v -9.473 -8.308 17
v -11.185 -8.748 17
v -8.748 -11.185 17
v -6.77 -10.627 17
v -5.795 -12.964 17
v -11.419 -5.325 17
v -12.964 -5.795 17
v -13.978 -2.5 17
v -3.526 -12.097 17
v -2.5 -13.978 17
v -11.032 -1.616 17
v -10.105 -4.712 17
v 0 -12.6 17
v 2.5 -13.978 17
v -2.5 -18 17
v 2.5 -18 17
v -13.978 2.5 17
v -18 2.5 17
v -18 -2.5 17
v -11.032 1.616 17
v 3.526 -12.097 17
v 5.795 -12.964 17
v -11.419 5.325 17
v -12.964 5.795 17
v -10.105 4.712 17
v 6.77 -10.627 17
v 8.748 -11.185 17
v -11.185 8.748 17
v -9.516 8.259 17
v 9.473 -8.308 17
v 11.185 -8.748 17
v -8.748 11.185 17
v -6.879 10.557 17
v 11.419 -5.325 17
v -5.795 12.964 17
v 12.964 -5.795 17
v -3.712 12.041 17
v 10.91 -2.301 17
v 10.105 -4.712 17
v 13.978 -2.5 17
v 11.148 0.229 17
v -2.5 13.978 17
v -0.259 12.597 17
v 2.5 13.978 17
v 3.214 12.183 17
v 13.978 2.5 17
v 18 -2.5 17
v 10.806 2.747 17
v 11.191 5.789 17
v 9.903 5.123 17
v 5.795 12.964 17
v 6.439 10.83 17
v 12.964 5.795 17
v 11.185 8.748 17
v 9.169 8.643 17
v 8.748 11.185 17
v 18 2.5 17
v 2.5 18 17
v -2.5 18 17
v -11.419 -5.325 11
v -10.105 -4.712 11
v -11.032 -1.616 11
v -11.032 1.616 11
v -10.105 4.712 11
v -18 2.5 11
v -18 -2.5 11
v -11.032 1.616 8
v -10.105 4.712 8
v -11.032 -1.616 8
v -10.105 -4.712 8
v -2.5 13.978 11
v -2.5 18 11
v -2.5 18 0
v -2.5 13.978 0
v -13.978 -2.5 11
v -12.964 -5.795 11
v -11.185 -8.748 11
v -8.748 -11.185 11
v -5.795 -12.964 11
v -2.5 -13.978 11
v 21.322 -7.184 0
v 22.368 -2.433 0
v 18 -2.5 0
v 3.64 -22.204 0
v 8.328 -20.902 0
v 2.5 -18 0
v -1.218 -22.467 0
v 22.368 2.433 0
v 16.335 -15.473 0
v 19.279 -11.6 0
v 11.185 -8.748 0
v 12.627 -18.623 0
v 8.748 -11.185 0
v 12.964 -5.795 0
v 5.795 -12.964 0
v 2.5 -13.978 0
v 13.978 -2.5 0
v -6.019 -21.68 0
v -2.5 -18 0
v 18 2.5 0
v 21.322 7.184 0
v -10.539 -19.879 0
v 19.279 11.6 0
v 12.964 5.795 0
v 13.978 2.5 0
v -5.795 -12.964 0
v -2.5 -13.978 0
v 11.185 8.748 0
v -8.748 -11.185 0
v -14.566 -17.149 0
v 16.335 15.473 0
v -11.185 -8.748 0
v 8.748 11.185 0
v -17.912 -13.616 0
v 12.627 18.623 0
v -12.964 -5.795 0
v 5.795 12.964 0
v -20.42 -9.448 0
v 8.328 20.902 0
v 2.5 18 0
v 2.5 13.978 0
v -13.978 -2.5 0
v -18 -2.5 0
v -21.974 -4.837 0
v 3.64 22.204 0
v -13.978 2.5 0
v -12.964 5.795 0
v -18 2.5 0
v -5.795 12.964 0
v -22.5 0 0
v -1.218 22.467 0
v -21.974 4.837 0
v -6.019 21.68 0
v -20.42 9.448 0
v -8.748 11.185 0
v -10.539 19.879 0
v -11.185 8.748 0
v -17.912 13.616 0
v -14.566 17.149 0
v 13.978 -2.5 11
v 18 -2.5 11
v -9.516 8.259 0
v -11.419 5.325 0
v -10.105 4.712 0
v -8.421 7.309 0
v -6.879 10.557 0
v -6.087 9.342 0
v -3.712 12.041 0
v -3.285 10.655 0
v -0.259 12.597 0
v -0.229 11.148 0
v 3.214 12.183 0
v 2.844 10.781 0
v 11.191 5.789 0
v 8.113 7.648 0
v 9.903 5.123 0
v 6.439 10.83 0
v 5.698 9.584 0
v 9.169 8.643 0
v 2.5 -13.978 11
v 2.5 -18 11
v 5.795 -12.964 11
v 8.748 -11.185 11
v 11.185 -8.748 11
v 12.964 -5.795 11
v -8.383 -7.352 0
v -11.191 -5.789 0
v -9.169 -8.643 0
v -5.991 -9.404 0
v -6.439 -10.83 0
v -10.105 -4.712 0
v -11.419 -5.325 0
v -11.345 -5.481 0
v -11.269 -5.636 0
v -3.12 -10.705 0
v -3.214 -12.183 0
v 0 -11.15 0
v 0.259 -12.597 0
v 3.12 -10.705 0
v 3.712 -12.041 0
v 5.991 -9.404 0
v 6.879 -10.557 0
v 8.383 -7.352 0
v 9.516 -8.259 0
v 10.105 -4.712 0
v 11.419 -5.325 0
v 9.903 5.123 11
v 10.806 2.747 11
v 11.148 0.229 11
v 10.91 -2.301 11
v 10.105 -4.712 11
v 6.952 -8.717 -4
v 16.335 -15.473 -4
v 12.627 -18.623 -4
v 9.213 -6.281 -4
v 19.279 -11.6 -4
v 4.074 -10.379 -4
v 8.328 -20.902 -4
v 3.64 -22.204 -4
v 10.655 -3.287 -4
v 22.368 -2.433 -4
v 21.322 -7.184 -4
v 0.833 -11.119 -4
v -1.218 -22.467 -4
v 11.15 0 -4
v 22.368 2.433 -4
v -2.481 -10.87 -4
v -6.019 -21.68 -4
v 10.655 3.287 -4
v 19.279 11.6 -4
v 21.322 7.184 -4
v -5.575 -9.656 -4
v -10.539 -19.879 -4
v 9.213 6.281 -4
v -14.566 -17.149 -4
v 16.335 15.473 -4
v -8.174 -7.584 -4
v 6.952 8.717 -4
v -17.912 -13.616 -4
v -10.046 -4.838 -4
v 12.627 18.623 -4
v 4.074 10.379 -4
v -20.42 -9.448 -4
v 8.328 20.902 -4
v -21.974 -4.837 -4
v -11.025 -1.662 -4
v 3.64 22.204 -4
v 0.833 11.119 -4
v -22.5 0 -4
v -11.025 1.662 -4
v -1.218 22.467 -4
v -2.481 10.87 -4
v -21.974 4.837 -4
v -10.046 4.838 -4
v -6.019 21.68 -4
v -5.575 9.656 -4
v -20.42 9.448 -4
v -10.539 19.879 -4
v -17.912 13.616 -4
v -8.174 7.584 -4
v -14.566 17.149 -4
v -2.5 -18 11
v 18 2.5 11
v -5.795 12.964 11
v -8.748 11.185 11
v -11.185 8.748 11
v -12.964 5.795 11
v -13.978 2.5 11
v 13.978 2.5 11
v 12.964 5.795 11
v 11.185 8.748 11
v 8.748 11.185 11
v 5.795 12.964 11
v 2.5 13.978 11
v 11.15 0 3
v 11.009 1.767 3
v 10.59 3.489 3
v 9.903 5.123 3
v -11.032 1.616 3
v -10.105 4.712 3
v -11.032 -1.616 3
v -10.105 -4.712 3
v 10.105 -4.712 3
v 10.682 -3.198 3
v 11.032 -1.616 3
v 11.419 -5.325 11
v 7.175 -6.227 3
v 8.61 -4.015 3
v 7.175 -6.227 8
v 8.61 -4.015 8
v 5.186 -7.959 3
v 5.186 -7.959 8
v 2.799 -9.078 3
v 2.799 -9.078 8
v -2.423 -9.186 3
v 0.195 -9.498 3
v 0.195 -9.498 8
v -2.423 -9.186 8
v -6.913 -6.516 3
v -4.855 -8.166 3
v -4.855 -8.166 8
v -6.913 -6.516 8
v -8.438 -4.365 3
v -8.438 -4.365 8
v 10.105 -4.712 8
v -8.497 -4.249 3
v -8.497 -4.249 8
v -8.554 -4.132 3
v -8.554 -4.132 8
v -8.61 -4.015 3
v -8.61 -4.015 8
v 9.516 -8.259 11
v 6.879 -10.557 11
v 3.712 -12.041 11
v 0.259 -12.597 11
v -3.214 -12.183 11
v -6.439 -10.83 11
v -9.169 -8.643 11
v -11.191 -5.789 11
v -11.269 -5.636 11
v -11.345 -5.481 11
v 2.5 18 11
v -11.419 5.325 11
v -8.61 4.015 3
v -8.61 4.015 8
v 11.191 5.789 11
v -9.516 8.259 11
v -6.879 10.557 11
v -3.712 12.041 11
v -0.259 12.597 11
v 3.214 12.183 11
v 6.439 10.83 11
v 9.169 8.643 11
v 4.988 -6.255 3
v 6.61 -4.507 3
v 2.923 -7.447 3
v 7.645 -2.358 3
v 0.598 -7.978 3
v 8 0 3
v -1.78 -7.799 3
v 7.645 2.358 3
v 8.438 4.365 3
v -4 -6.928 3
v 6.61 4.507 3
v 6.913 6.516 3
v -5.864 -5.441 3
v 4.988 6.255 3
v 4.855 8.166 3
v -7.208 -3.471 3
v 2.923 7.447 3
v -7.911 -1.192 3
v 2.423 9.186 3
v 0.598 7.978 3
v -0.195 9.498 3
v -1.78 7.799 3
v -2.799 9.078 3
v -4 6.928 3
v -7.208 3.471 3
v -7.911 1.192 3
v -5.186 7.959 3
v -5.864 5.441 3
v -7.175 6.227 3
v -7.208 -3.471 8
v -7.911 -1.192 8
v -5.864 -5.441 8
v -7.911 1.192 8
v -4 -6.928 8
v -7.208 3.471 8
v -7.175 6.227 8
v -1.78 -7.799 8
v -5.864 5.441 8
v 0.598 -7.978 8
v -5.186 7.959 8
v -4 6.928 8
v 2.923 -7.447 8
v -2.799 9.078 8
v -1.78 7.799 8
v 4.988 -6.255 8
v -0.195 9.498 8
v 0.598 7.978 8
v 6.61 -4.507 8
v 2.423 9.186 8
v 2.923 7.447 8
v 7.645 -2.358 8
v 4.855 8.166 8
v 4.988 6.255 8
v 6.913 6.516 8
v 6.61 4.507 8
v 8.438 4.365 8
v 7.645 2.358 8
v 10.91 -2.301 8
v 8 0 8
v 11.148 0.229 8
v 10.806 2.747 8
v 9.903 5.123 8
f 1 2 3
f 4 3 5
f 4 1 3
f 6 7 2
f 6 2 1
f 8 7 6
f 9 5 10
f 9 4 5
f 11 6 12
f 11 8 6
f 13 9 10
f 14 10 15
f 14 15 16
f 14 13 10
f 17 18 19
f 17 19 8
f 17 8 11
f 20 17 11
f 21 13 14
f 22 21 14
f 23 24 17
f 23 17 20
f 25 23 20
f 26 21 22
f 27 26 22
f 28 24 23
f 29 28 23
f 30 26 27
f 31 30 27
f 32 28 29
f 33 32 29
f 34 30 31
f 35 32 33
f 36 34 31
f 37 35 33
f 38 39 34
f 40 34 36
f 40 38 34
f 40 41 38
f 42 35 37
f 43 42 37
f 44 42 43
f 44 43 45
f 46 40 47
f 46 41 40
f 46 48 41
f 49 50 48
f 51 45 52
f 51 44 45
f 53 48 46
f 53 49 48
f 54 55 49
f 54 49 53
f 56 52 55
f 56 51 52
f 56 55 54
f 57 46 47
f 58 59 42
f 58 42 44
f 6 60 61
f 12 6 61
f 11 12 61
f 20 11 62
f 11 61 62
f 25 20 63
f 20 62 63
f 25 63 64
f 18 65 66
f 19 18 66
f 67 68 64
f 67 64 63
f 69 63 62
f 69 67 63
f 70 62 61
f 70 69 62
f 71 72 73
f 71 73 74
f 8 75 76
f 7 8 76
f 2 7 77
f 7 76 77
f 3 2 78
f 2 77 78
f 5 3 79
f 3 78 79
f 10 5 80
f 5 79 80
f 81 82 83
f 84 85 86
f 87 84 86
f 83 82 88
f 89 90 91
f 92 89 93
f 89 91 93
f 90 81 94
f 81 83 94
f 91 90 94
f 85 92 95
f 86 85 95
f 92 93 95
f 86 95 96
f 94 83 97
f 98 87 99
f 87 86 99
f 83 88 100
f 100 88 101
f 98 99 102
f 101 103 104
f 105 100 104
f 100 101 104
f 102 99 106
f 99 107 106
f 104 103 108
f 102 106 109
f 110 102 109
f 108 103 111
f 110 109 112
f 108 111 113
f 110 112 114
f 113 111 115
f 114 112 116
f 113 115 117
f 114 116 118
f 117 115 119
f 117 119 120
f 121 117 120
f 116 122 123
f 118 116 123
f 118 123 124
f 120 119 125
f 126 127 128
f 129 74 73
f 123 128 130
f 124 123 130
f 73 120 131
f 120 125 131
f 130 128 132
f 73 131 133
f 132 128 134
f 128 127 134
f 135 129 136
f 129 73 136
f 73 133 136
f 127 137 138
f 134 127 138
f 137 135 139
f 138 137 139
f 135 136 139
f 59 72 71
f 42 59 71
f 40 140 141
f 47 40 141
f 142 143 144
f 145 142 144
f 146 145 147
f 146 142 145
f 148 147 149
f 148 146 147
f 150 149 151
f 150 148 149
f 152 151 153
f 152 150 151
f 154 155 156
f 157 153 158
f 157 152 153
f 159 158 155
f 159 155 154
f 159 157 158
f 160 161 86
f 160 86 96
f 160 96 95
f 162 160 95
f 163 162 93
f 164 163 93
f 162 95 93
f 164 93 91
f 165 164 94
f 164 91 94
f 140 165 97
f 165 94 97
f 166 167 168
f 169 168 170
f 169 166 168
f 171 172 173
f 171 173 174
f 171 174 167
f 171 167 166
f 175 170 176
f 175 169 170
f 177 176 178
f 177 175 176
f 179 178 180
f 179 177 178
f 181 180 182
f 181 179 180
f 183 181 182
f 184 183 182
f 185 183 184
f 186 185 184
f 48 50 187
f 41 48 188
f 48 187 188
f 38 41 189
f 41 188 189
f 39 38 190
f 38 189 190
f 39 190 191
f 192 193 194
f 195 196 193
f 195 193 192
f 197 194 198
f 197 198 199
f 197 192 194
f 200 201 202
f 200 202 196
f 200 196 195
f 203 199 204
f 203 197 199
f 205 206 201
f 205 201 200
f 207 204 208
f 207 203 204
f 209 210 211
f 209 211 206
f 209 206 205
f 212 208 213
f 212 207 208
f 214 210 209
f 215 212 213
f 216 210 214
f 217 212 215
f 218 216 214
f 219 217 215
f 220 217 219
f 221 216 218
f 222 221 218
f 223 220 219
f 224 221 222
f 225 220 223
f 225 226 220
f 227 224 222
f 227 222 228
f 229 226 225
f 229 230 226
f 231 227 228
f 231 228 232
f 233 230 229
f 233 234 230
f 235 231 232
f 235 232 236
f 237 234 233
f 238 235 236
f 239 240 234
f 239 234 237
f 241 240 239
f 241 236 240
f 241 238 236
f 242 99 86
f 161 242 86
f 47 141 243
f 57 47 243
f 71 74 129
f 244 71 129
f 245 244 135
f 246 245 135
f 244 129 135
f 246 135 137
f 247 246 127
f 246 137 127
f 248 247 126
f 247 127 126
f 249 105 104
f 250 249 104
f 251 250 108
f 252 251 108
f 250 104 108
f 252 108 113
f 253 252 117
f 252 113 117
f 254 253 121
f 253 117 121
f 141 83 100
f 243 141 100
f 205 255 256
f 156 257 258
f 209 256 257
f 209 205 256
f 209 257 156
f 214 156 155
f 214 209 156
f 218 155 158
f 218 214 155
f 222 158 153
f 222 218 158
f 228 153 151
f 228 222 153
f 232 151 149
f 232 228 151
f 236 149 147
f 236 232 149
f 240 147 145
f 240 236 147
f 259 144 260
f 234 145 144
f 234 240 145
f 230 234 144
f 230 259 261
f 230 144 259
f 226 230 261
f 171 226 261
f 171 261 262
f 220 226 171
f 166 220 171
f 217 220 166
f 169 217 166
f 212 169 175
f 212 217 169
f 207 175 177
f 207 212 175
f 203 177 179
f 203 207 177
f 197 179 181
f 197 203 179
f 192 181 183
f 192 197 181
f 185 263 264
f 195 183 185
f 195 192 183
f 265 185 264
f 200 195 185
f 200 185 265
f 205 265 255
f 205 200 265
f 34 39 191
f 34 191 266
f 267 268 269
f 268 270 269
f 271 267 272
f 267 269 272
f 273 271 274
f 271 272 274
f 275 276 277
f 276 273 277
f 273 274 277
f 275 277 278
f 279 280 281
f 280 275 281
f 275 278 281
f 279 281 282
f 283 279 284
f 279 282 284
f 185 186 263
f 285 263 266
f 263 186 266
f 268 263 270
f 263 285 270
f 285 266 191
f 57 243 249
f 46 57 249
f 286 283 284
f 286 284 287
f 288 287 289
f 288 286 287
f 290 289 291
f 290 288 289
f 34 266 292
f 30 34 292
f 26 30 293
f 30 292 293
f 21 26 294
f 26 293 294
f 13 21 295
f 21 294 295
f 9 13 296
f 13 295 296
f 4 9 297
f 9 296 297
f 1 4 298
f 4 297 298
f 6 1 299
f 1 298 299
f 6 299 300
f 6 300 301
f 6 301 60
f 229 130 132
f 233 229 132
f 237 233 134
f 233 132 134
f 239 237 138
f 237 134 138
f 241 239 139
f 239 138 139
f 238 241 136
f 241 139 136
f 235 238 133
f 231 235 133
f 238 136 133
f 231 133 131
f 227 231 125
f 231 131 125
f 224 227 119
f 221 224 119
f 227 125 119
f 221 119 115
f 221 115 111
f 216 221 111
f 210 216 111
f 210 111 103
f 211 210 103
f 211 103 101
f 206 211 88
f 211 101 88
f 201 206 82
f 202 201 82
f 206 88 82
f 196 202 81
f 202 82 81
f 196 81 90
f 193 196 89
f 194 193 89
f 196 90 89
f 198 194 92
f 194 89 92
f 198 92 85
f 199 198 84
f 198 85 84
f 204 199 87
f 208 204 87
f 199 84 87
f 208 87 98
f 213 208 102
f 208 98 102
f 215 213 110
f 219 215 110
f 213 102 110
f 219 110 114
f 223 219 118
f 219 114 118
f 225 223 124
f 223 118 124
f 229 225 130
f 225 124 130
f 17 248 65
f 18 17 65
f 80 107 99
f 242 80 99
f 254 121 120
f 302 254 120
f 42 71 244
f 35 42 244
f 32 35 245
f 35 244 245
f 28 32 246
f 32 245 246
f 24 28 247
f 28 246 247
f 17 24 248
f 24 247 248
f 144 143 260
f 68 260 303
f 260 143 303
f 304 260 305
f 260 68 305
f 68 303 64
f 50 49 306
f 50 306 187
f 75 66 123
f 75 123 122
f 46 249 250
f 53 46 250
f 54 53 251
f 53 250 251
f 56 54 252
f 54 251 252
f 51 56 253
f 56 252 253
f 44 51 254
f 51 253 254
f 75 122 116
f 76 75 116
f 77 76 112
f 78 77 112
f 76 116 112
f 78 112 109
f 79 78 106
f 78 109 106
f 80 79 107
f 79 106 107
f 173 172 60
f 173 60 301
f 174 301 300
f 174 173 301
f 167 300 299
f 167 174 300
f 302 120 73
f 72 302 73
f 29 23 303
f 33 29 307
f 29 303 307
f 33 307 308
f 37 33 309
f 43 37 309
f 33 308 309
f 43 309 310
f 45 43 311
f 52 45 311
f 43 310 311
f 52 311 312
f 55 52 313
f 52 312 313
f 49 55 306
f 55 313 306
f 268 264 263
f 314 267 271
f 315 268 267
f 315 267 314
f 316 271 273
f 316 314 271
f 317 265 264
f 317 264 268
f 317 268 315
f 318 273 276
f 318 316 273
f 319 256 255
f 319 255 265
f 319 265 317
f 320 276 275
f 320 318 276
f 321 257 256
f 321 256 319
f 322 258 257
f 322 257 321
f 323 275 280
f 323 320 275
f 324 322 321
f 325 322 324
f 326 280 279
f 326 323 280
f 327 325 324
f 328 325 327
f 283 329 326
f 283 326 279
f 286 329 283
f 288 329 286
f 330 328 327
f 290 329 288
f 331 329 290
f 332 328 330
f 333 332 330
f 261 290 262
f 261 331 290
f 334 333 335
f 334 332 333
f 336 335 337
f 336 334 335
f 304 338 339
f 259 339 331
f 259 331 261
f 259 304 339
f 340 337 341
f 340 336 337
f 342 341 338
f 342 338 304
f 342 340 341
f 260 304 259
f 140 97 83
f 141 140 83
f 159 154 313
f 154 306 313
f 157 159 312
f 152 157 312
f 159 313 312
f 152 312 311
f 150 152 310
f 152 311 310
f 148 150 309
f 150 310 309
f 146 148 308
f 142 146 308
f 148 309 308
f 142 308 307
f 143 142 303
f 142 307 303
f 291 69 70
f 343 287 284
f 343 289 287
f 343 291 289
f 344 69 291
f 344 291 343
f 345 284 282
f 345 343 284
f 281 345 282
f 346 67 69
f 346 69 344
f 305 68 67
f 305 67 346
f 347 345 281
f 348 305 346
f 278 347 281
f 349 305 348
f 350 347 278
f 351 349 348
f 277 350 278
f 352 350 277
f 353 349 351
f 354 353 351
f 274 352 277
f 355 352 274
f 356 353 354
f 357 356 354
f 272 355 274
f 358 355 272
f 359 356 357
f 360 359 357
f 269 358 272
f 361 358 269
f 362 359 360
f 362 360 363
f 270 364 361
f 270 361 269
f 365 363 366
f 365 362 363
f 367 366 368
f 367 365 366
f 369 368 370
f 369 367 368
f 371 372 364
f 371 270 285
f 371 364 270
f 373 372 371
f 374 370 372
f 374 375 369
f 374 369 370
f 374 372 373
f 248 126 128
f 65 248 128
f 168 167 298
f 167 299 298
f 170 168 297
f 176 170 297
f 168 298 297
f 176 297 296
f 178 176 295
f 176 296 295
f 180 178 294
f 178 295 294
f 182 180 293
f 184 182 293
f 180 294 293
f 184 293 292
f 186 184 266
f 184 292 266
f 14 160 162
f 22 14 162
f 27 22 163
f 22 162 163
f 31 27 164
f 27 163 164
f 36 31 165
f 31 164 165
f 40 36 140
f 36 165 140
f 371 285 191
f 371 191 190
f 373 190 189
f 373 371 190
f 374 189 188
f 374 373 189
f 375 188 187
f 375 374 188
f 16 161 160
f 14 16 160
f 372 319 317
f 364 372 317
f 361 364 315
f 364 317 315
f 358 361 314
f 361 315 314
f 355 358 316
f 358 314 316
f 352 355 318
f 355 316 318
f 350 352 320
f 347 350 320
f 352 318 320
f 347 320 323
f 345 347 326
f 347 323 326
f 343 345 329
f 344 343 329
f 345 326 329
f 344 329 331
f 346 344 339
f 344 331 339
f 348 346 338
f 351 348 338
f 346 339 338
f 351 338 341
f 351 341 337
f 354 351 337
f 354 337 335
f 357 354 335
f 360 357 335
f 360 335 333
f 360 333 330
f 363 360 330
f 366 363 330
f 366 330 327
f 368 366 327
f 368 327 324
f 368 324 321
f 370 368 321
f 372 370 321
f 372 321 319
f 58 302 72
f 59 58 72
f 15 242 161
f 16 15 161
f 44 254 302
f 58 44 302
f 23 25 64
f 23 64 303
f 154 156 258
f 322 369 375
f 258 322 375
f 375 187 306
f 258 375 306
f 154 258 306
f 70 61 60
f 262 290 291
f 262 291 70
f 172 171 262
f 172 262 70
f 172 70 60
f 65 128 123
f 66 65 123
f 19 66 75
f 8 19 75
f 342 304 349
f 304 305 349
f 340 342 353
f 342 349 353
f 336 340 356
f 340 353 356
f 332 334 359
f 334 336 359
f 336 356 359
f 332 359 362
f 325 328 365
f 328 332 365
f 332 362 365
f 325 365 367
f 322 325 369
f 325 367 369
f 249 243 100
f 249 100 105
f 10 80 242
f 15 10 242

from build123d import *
from build123d.topology import SkipClean

# Parameters (mm, degrees)
ESBO_O1_R                 = 11.15
RESSALTO_EXTRUS_O1_DEPTH  = 15
ESBO_O2_R                 = 22.5
RESSALTO_EXTRUS_O2_DEPTH  = 4
RESSALTO_EXTRUS_O6_START  = -8
ESBO_O5_R                 = 11.15
ESBO_O5_R_2               = 8
RESSALTO_EXTRUS_O6_DEPTH  = 8
RESSALTO_EXTRUS_O7_START  = 4
ESBO_O7_R                 = 14.2
ESBO_O7_R_2               = 11.15
RESSALTO_EXTRUS_O7_DEPTH  = 4
RESSALTO_EXTRUS_O8_START  = 4
ESBO_O8_R                 = 11.15
ESBO_O8_R_2               = 8
RESSALTO_EXTRUS_O8_DEPTH  = 4
CORTE_EXTRUS_O1_DEPTH     = 7
CORTE_EXTRUS_O2_DEPTH     = 8
CORTE_EXTRUS_O3_START     = -4
CORTE_EXTRUS_O3_DEPTH     = 4
CORTE_EXTRUS_O4_START     = -11
CORTE_EXTRUS_O4_DEPTH     = 11
CORTE_EXTRUS_O5_START     = -3
ESBO_O17_R                = 11.15
CORTE_EXTRUS_O5_DEPTH     = 3
RESSALTO_EXTRUS_O11_DEPTH = 6


with BuildPart() as part:
    # Esboço1 → Ressalto-extrusão1 (new body)
    with BuildSketch(Plane.XY):
        with BuildLine():
            Line((-2.5, 18), (-2.5, 13.978197309))
            ThreePointArc((-2.5, 13.978197309), (-10.040916293, 10.040916293), (-13.978197309, 2.5))
            Line((-13.978197309, 2.5), (-18, 2.5))
            Line((-18, 2.5), (-18, -2.5))
            Line((-18, -2.5), (-13.978197309, -2.5))
            ThreePointArc((-13.978197309, -2.5), (-10.040916293, -10.040916293), (-2.5, -13.978197309))
            Line((-2.5, -13.978197309), (-2.5, -18))
            Line((-2.5, -18), (2.5, -18))
            Line((2.5, -18), (2.5, -13.978197309))
            ThreePointArc((2.5, -13.978197309), (10.040916293, -10.040916293), (13.978197309, -2.5))
            Line((13.978197309, -2.5), (18, -2.5))
            Line((18, -2.5), (18, 2.5))
            Line((18, 2.5), (13.978197309, 2.5))
            ThreePointArc((13.978197309, 2.5), (10.040916293, 10.040916293), (2.5, 13.978197309))
            Line((2.5, 13.978197309), (2.5, 18))
            Line((2.5, 18), (-2.5, 18))
        make_face()
        Circle(ESBO_O1_R, mode=Mode.SUBTRACT)
    extrude(amount=RESSALTO_EXTRUS_O1_DEPTH)

    # Esboço5 → Ressalto-extrusão6 (add)
    with BuildSketch(Plane.XY.offset(15).offset(RESSALTO_EXTRUS_O6_START)):
        Circle(ESBO_O5_R)
        Circle(ESBO_O5_R_2, mode=Mode.SUBTRACT)
    extrude(amount=RESSALTO_EXTRUS_O6_DEPTH)



with BuildPart() as body_2:
    # Esboço2 → Ressalto-extrusão2 (new body)
    # profile 1 of 5: a face of its own
    with SkipClean():  # the faces are left unmerged after this step: merging them gives an invalid solid
        with BuildSketch(Plane(origin=(0, 0, 0), x_dir=(-1, 0, 0), z_dir=(0, 0, -1))):
            Circle(ESBO_O2_R)
            with BuildLine():
                Line((2.5, 13.978197309), (2.5, 18))
                Line((2.5, 18), (-2.5, 18))
                Line((-2.5, 18), (-2.5, 13.978197309))
                ThreePointArc((-2.5, 13.978197309), (-10.040916293, 10.040916293), (-13.978197309, 2.5))
                Line((-13.978197309, 2.5), (-18, 2.5))
                Line((-18, 2.5), (-18, -2.5))
                Line((-18, -2.5), (-13.978197309, -2.5))
                ThreePointArc((-13.978197309, -2.5), (-10.040916293, -10.040916293), (-2.5, -13.978197309))
                Line((-2.5, -13.978197309), (-2.5, -18))
                Line((-2.5, -18), (2.5, -18))
                Line((2.5, -18), (2.5, -13.978197309))
                ThreePointArc((2.5, -13.978197309), (10.040916293, -10.040916293), (13.978197309, -2.5))
                Line((13.978197309, -2.5), (18, -2.5))
                Line((18, -2.5), (18, 2.5))
                Line((18, 2.5), (13.978197309, 2.5))
                ThreePointArc((13.978197309, 2.5), (10.040916293, 10.040916293), (2.5, 13.978197309))
            make_face(mode=Mode.SUBTRACT)
        # profile 2 of 5: a face of its own
        with BuildSketch(Plane(origin=(0, 0, 0), x_dir=(-1, 0, 0), z_dir=(0, 0, -1))):
            with BuildLine():
                Line((2.5, -18), (2.5, -13.978197309))
                ThreePointArc((2.5, -13.978197309), (0, -14.2), (-2.5, -13.978197309))
                Line((-2.5, -13.978197309), (-2.5, -18))
                Line((-2.5, -18), (2.5, -18))
            make_face()
        # profile 3 of 5: a face of its own
        with BuildSketch(Plane(origin=(0, 0, 0), x_dir=(-1, 0, 0), z_dir=(0, 0, -1))):
            with BuildLine():
                ThreePointArc((-13.978197309, -2.5), (-14.2, 0), (-13.978197309, 2.5))
                Line((-13.978197309, 2.5), (-18, 2.5))
                Line((-18, 2.5), (-18, -2.5))
                Line((-18, -2.5), (-13.978197309, -2.5))
            make_face()
        # profile 4 of 5: a face of its own
        with BuildSketch(Plane(origin=(0, 0, 0), x_dir=(-1, 0, 0), z_dir=(0, 0, -1))):
            with BuildLine():
                ThreePointArc((-2.5, 13.978197309), (0, 14.2), (2.5, 13.978197309))
                Line((2.5, 13.978197309), (2.5, 18))
                Line((2.5, 18), (-2.5, 18))
                Line((-2.5, 18), (-2.5, 13.978197309))
            make_face()
        # profile 5 of 5: a face of its own
        with BuildSketch(Plane(origin=(0, 0, 0), x_dir=(-1, 0, 0), z_dir=(0, 0, -1))):
            with BuildLine():
                Line((18, 2.5), (13.978197309, 2.5))
                ThreePointArc((13.978197309, 2.5), (14.2, 0), (13.978197309, -2.5))
                Line((13.978197309, -2.5), (18, -2.5))
                Line((18, -2.5), (18, 2.5))
            make_face()
        extrude(amount=RESSALTO_EXTRUS_O2_DEPTH)


with BuildPart() as part_1:
    with SkipClean():  # the faces are left unmerged after this step: merging them gives an invalid solid
        add(part.part)

        add(body_2.part)  # Ressalto-extrusão7 merges body 2
        # Esboço7 → Ressalto-extrusão7 (add)
        with BuildSketch(Plane(origin=(0, 0, 0), x_dir=(-1, 0, 0), z_dir=(0, 0, -1)).offset(RESSALTO_EXTRUS_O7_START)):
            Circle(ESBO_O7_R)
            with Locations(Location((0, 0, 0), (0, 0, 180))):
                Circle(ESBO_O7_R_2, mode=Mode.SUBTRACT)
        extrude(amount=-RESSALTO_EXTRUS_O7_DEPTH)

    # Esboço8 → Ressalto-extrusão8 (add)
    with BuildSketch(Plane(origin=(0, 0, 7), x_dir=(-1, 0, 0), z_dir=(0, 0, -1)).offset(RESSALTO_EXTRUS_O8_START)):
        Circle(ESBO_O8_R)
        with Locations(Location((0, 0, 0), (0, 0, 180))):
            Circle(ESBO_O8_R_2, mode=Mode.SUBTRACT)
    extrude(amount=-RESSALTO_EXTRUS_O8_DEPTH)

    # Esboço11 → Corte-extrusão1 (cut)
    with BuildSketch(Plane.XY.offset(15)):
        with BuildLine():
            Line((-11.191152491, -5.789482353), (-8.437773704, -4.365085901))
            ThreePointArc((-8.437773704, -4.365085901), (0.195118203, -9.497996046), (8.609923977, -4.014873487))
            Line((8.609923977, -4.014873487), (11.419478117, -5.324990098))
            ThreePointArc((11.419478117, -5.324990098), (0.258788353, -12.597342124), (-11.191152491, -5.789482353))
        make_face()
        with BuildLine():
            Line((-11.419478117, 5.324990098), (-8.609923977, 4.014873487))
            ThreePointArc((-8.609923977, 4.014873487), (-0.195118203, 9.497996046), (8.437773704, 4.365085901))
            Line((8.437773704, 4.365085901), (11.191152491, 5.789482353))
            ThreePointArc((11.191152491, 5.789482353), (-0.258788353, 12.597342124), (-11.419478117, 5.324990098))
        make_face()
    extrude(amount=-CORTE_EXTRUS_O1_DEPTH, mode=Mode.SUBTRACT)

    # Esboço12 → Corte-extrusão2 (cut)
    with BuildSketch(Plane.XY.offset(8)):
        with BuildLine():
            Line((11.419478117, -5.324990098), (8.609923977, -4.014873487))
            ThreePointArc((8.609923977, -4.014873487), (0.195118203, -9.497996046), (-8.437773704, -4.365085901))
            Line((-8.437773704, -4.365085901), (-11.191152491, -5.789482353))
            ThreePointArc((-11.191152491, -5.789482353), (0.258788353, -12.597342124), (11.419478117, -5.324990098))
        make_face()
        with BuildLine():
            Line((-11.419478117, 5.324990098), (-8.609923977, 4.014873487))
            ThreePointArc((-8.609923977, 4.014873487), (-0.195118203, 9.497996046), (8.437773704, 4.365085901))
            Line((8.437773704, 4.365085901), (11.191152491, 5.789482353))
            ThreePointArc((11.191152491, 5.789482353), (-0.258788353, 12.597342124), (-11.419478117, 5.324990098))
        make_face()
    extrude(amount=-CORTE_EXTRUS_O2_DEPTH, mode=Mode.SUBTRACT)

    # Esboço13 → Corte-extrusão3 (cut)
    with BuildSketch(Plane.XY.offset(15).offset(CORTE_EXTRUS_O3_START)):
        with BuildLine():
            Line((-2.5, 18), (-2.5, 13.978197309))
            ThreePointArc((-2.5, 13.978197309), (-10.040916293, 10.040916293), (-13.978197309, 2.5))
            Line((-13.978197309, 2.5), (-18, 2.5))
            Line((-18, 2.5), (-18, -2.5))
            Line((-18, -2.5), (-13.978197309, -2.5))
            ThreePointArc((-13.978197309, -2.5), (-10.040916293, -10.040916293), (-2.5, -13.978197309))
            Line((-2.5, -13.978197309), (-2.5, -18))
            Line((-2.5, -18), (2.5, -18))
            Line((2.5, -18), (2.5, -13.978197309))
            ThreePointArc((2.5, -13.978197309), (10.040916293, -10.040916293), (13.978197309, -2.5))
            Line((13.978197309, -2.5), (18, -2.5))
            Line((18, -2.5), (18, 2.5))
            Line((18, 2.5), (13.978197309, 2.5))
            ThreePointArc((13.978197309, 2.5), (10.040916293, 10.040916293), (2.5, 13.978197309))
            Line((2.5, 13.978197309), (2.5, 18))
            Line((2.5, 18), (-2.5, 18))
        make_face()
    extrude(amount=CORTE_EXTRUS_O3_DEPTH, mode=Mode.SUBTRACT)

    # Esboço14 → Corte-extrusão4 (cut)
    with BuildSketch(Plane.XY.offset(11).offset(CORTE_EXTRUS_O4_START)):
        with BuildLine():
            Line((11.191152491, 5.789482353), (8.437773704, 4.365085901))
            ThreePointArc((8.437773704, 4.365085901), (-0.195118203, 9.497996046), (-8.609923977, 4.014873487))
            Line((-8.609923977, 4.014873487), (-11.419478117, 5.324990098))
            ThreePointArc((-11.419478117, 5.324990098), (-0.258788353, 12.597342124), (11.191152491, 5.789482353))
        make_face()
        with BuildLine():
            Line((-8.609923977, -4.014873487), (-11.419478117, -5.324990098))
            ThreePointArc((-11.419478117, -5.324990098), (-11.307700579, -5.55840873), (-11.191152491, -5.789482353))
            Line((-11.191152491, -5.789482353), (-8.437773704, -4.365085901))
            ThreePointArc((-8.437773704, -4.365085901), (-8.525647262, -4.190863725), (-8.609923977, -4.014873487))
        make_face()
    extrude(amount=CORTE_EXTRUS_O4_DEPTH, mode=Mode.SUBTRACT)

    # Esboço17 → Corte-extrusão5 (cut)
    with SkipClean():  # the faces are left unmerged after this step: merging them gives an invalid solid
        with BuildSketch(Plane.XY.offset(11).offset(CORTE_EXTRUS_O5_START)):
            with Locations(Location((0, 0, 0), (0, 0, 335))):
                Circle(ESBO_O17_R)
        extrude(amount=CORTE_EXTRUS_O5_DEPTH, mode=Mode.SUBTRACT)

    # Esboço18 → Ressalto-extrusão11 (add)
    with SkipClean():  # the faces are left unmerged after this step: merging them gives an invalid solid
        with BuildSketch(Plane.XY.offset(11)):
            with BuildLine():
                Line((2.5, 13.978197309), (2.5, 18))
                Line((2.5, 18), (-2.5, 18))
                Line((-2.5, 18), (-2.5, 13.978197309))
                ThreePointArc((-2.5, 13.978197309), (-10.040916293, 10.040916293), (-13.978197309, 2.5))
                Line((-13.978197309, 2.5), (-18, 2.5))
                Line((-18, 2.5), (-18, -2.5))
                Line((-18, -2.5), (-13.978197309, -2.5))
                ThreePointArc((-13.978197309, -2.5), (-10.040916293, -10.040916293), (-2.5, -13.978197309))
                Line((-2.5, -13.978197309), (-2.5, -18))
                Line((-2.5, -18), (2.5, -18))
                Line((2.5, -18), (2.5, -13.978197309))
                ThreePointArc((2.5, -13.978197309), (10.040916293, -10.040916293), (13.978197309, -2.5))
                Line((13.978197309, -2.5), (18, -2.5))
                Line((18, -2.5), (18, 2.5))
                Line((18, 2.5), (13.978197309, 2.5))
                ThreePointArc((13.978197309, 2.5), (10.040916293, 10.040916293), (2.5, 13.978197309))
            make_face()
            with BuildLine():
                Line((-11.419478117, -5.324990098), (-10.105331825, -4.712193618))
                ThreePointArc((-10.105331825, -4.712193618), (-11.15, 0), (-10.105331825, 4.712193618))
                Line((-10.105331825, 4.712193618), (-11.419478117, 5.324990098))
                ThreePointArc((-11.419478117, 5.324990098), (-0.258788353, 12.597342124), (11.191152491, 5.789482353))
                Line((11.191152491, 5.789482353), (9.903281768, 5.1232324))
                ThreePointArc((9.903281768, 5.1232324), (11.147647991, 0.229007154), (10.105331825, -4.712193618))
                Line((10.105331825, -4.712193618), (11.419478117, -5.324990098))
                ThreePointArc((11.419478117, -5.324990098), (0, -12.6), (-11.419478117, -5.324990098))
            make_face(mode=Mode.SUBTRACT)
        extrude(amount=RESSALTO_EXTRUS_O11_DEPTH)


solid = part_1.part
